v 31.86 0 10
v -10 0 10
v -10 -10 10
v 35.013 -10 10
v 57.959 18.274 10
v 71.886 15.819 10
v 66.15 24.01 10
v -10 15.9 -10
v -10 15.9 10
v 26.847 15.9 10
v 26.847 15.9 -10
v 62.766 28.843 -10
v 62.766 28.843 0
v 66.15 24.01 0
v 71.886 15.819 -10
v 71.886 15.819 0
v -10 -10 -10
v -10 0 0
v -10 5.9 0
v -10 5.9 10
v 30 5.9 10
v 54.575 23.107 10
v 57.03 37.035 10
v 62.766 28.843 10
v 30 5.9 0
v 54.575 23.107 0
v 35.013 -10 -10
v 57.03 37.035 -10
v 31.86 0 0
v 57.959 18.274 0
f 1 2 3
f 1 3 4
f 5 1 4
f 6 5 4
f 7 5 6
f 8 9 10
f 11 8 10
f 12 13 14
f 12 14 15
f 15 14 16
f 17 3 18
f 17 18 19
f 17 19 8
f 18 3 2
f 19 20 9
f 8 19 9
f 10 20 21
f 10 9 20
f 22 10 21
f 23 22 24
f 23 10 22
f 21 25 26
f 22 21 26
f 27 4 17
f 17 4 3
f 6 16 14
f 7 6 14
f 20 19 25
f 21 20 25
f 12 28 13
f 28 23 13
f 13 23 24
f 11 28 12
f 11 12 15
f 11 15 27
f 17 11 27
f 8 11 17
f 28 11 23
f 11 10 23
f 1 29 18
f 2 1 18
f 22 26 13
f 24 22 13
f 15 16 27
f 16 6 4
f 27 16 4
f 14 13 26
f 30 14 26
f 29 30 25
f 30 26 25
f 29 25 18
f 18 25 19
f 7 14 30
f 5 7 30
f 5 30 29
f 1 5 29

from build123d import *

# Parameters (mm, degrees)
AUFSATZ_LINEAR_AUSTRAGEN2_DEPTH   = 10
AUFSATZ_LINEAR_AUSTRAGEN2_2_DEPTH = 10
AUFSATZ_LINEAR_AUSTRAGEN3_DEPTH   = 10


with BuildPart() as part:
    # Skizze1 → Aufsatz-Linear austragen2 (new body)
    with BuildSketch(Plane.XY):
        Polygon((-10, 5.9), (0, 5.9), (30, 5.9), (54.574561329, 23.107293091), (62.766081772, 28.843057454), (57.030317408, 37.034577897), (26.847012111, 15.9), (-10, 15.9), align=None)
    extrude(amount=AUFSATZ_LINEAR_AUSTRAGEN2_DEPTH)



with BuildPart() as body_2:
    # Skizze1 → Aufsatz-Linear austragen2 2 (new body)
    with BuildSketch(Plane.XY):
        Polygon((31.860262854, 0), (0, 0), (-10, 0), (-10, -10), (35.013250743, -10), (71.88594711, 15.81853995), (66.150182746, 24.010060393), (57.958662303, 18.274296029), align=None)
    extrude(amount=AUFSATZ_LINEAR_AUSTRAGEN2_2_DEPTH)


with BuildPart() as part_1:
    add(part.part)

    add(body_2.part)  # Aufsatz-Linear austragen3 merges body 2
    # Skizze2 → Aufsatz-Linear austragen3 (add)
    with BuildSketch(Plane(origin=(0, 0, 0), x_dir=(-1, 0, 0), z_dir=(0, 0, -1))):
        Polygon((10, 15.9), (-26.847012111, 15.9), (-30, 5.9), (10, 5.9), align=None)
        Polygon((10, 5.9), (-30, 5.9), (-35.013250743, -10), (10, -10), align=None)
        Polygon((-30, 5.9), (-62.766081772, 28.843057454), (-71.88594711, 15.81853995), (-35.013250743, -10), align=None)
        Polygon((-26.847012111, 15.9), (-57.030317408, 37.034577897), (-62.766081772, 28.843057454), (-30, 5.9), align=None)
    extrude(amount=AUFSATZ_LINEAR_AUSTRAGEN3_DEPTH)


solid = part_1.part
